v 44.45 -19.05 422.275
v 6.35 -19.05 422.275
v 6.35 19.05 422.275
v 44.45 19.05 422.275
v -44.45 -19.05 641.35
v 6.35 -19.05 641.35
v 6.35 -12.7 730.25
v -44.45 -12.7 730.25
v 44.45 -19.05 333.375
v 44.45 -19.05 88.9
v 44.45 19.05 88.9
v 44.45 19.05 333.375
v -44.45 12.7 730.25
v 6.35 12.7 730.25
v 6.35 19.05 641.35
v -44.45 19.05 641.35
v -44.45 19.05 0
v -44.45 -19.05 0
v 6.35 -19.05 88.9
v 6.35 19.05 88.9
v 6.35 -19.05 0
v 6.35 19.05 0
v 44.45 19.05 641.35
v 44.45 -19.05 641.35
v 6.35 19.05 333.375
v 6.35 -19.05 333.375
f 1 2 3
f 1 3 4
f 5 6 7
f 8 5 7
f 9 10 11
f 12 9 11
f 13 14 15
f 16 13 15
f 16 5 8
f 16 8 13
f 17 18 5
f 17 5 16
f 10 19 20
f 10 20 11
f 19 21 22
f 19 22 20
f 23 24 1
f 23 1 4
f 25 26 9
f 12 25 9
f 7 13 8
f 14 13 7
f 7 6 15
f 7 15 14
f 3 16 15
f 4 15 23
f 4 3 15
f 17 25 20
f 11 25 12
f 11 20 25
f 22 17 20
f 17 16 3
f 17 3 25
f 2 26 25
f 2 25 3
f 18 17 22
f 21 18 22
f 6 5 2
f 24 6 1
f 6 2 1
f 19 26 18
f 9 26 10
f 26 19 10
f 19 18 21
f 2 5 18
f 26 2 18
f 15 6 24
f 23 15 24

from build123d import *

# Parameters (mm, degrees)
F0_W     = 88.9
F0_H     = 38.1
F1_DEPTH = 730.25
F2_W     = 38.1
F2_H     = 88.9
F3_DEPTH = 38.101
F5_DEPTH = 50.801


with BuildPart() as f1:
    # F0 (on Top) → F1 (new body)
    with BuildSketch(Plane.XY):
        Rectangle(F0_W, F0_H)
    extrude(amount=F1_DEPTH)

    # F2 (on face) → F3 (cut, through all)
    with BuildSketch(Plane.XZ.offset(19.05)):
        with Locations((25.4, 44.45)):
            Rectangle(F2_W, F2_H)
        with Locations((25.4, 377.825)):
            Rectangle(F2_W, F2_H)
        with Locations((25.4, 685.8)):
            Rectangle(F2_W, F2_H)
    extrude(amount=-F3_DEPTH, mode=Mode.SUBTRACT)

    # F4 (on face) → F5 (cut, through all)
    with BuildSketch(Plane.YZ.offset(6.35)):
        Polygon((-12.7, 730.25), (-19.05, 730.25), (-19.05, 641.35), align=None)
        Polygon((19.05, 641.35), (19.05, 730.25), (12.7, 730.25), align=None)
    extrude(amount=-F5_DEPTH, mode=Mode.SUBTRACT)


solid = f1.part
